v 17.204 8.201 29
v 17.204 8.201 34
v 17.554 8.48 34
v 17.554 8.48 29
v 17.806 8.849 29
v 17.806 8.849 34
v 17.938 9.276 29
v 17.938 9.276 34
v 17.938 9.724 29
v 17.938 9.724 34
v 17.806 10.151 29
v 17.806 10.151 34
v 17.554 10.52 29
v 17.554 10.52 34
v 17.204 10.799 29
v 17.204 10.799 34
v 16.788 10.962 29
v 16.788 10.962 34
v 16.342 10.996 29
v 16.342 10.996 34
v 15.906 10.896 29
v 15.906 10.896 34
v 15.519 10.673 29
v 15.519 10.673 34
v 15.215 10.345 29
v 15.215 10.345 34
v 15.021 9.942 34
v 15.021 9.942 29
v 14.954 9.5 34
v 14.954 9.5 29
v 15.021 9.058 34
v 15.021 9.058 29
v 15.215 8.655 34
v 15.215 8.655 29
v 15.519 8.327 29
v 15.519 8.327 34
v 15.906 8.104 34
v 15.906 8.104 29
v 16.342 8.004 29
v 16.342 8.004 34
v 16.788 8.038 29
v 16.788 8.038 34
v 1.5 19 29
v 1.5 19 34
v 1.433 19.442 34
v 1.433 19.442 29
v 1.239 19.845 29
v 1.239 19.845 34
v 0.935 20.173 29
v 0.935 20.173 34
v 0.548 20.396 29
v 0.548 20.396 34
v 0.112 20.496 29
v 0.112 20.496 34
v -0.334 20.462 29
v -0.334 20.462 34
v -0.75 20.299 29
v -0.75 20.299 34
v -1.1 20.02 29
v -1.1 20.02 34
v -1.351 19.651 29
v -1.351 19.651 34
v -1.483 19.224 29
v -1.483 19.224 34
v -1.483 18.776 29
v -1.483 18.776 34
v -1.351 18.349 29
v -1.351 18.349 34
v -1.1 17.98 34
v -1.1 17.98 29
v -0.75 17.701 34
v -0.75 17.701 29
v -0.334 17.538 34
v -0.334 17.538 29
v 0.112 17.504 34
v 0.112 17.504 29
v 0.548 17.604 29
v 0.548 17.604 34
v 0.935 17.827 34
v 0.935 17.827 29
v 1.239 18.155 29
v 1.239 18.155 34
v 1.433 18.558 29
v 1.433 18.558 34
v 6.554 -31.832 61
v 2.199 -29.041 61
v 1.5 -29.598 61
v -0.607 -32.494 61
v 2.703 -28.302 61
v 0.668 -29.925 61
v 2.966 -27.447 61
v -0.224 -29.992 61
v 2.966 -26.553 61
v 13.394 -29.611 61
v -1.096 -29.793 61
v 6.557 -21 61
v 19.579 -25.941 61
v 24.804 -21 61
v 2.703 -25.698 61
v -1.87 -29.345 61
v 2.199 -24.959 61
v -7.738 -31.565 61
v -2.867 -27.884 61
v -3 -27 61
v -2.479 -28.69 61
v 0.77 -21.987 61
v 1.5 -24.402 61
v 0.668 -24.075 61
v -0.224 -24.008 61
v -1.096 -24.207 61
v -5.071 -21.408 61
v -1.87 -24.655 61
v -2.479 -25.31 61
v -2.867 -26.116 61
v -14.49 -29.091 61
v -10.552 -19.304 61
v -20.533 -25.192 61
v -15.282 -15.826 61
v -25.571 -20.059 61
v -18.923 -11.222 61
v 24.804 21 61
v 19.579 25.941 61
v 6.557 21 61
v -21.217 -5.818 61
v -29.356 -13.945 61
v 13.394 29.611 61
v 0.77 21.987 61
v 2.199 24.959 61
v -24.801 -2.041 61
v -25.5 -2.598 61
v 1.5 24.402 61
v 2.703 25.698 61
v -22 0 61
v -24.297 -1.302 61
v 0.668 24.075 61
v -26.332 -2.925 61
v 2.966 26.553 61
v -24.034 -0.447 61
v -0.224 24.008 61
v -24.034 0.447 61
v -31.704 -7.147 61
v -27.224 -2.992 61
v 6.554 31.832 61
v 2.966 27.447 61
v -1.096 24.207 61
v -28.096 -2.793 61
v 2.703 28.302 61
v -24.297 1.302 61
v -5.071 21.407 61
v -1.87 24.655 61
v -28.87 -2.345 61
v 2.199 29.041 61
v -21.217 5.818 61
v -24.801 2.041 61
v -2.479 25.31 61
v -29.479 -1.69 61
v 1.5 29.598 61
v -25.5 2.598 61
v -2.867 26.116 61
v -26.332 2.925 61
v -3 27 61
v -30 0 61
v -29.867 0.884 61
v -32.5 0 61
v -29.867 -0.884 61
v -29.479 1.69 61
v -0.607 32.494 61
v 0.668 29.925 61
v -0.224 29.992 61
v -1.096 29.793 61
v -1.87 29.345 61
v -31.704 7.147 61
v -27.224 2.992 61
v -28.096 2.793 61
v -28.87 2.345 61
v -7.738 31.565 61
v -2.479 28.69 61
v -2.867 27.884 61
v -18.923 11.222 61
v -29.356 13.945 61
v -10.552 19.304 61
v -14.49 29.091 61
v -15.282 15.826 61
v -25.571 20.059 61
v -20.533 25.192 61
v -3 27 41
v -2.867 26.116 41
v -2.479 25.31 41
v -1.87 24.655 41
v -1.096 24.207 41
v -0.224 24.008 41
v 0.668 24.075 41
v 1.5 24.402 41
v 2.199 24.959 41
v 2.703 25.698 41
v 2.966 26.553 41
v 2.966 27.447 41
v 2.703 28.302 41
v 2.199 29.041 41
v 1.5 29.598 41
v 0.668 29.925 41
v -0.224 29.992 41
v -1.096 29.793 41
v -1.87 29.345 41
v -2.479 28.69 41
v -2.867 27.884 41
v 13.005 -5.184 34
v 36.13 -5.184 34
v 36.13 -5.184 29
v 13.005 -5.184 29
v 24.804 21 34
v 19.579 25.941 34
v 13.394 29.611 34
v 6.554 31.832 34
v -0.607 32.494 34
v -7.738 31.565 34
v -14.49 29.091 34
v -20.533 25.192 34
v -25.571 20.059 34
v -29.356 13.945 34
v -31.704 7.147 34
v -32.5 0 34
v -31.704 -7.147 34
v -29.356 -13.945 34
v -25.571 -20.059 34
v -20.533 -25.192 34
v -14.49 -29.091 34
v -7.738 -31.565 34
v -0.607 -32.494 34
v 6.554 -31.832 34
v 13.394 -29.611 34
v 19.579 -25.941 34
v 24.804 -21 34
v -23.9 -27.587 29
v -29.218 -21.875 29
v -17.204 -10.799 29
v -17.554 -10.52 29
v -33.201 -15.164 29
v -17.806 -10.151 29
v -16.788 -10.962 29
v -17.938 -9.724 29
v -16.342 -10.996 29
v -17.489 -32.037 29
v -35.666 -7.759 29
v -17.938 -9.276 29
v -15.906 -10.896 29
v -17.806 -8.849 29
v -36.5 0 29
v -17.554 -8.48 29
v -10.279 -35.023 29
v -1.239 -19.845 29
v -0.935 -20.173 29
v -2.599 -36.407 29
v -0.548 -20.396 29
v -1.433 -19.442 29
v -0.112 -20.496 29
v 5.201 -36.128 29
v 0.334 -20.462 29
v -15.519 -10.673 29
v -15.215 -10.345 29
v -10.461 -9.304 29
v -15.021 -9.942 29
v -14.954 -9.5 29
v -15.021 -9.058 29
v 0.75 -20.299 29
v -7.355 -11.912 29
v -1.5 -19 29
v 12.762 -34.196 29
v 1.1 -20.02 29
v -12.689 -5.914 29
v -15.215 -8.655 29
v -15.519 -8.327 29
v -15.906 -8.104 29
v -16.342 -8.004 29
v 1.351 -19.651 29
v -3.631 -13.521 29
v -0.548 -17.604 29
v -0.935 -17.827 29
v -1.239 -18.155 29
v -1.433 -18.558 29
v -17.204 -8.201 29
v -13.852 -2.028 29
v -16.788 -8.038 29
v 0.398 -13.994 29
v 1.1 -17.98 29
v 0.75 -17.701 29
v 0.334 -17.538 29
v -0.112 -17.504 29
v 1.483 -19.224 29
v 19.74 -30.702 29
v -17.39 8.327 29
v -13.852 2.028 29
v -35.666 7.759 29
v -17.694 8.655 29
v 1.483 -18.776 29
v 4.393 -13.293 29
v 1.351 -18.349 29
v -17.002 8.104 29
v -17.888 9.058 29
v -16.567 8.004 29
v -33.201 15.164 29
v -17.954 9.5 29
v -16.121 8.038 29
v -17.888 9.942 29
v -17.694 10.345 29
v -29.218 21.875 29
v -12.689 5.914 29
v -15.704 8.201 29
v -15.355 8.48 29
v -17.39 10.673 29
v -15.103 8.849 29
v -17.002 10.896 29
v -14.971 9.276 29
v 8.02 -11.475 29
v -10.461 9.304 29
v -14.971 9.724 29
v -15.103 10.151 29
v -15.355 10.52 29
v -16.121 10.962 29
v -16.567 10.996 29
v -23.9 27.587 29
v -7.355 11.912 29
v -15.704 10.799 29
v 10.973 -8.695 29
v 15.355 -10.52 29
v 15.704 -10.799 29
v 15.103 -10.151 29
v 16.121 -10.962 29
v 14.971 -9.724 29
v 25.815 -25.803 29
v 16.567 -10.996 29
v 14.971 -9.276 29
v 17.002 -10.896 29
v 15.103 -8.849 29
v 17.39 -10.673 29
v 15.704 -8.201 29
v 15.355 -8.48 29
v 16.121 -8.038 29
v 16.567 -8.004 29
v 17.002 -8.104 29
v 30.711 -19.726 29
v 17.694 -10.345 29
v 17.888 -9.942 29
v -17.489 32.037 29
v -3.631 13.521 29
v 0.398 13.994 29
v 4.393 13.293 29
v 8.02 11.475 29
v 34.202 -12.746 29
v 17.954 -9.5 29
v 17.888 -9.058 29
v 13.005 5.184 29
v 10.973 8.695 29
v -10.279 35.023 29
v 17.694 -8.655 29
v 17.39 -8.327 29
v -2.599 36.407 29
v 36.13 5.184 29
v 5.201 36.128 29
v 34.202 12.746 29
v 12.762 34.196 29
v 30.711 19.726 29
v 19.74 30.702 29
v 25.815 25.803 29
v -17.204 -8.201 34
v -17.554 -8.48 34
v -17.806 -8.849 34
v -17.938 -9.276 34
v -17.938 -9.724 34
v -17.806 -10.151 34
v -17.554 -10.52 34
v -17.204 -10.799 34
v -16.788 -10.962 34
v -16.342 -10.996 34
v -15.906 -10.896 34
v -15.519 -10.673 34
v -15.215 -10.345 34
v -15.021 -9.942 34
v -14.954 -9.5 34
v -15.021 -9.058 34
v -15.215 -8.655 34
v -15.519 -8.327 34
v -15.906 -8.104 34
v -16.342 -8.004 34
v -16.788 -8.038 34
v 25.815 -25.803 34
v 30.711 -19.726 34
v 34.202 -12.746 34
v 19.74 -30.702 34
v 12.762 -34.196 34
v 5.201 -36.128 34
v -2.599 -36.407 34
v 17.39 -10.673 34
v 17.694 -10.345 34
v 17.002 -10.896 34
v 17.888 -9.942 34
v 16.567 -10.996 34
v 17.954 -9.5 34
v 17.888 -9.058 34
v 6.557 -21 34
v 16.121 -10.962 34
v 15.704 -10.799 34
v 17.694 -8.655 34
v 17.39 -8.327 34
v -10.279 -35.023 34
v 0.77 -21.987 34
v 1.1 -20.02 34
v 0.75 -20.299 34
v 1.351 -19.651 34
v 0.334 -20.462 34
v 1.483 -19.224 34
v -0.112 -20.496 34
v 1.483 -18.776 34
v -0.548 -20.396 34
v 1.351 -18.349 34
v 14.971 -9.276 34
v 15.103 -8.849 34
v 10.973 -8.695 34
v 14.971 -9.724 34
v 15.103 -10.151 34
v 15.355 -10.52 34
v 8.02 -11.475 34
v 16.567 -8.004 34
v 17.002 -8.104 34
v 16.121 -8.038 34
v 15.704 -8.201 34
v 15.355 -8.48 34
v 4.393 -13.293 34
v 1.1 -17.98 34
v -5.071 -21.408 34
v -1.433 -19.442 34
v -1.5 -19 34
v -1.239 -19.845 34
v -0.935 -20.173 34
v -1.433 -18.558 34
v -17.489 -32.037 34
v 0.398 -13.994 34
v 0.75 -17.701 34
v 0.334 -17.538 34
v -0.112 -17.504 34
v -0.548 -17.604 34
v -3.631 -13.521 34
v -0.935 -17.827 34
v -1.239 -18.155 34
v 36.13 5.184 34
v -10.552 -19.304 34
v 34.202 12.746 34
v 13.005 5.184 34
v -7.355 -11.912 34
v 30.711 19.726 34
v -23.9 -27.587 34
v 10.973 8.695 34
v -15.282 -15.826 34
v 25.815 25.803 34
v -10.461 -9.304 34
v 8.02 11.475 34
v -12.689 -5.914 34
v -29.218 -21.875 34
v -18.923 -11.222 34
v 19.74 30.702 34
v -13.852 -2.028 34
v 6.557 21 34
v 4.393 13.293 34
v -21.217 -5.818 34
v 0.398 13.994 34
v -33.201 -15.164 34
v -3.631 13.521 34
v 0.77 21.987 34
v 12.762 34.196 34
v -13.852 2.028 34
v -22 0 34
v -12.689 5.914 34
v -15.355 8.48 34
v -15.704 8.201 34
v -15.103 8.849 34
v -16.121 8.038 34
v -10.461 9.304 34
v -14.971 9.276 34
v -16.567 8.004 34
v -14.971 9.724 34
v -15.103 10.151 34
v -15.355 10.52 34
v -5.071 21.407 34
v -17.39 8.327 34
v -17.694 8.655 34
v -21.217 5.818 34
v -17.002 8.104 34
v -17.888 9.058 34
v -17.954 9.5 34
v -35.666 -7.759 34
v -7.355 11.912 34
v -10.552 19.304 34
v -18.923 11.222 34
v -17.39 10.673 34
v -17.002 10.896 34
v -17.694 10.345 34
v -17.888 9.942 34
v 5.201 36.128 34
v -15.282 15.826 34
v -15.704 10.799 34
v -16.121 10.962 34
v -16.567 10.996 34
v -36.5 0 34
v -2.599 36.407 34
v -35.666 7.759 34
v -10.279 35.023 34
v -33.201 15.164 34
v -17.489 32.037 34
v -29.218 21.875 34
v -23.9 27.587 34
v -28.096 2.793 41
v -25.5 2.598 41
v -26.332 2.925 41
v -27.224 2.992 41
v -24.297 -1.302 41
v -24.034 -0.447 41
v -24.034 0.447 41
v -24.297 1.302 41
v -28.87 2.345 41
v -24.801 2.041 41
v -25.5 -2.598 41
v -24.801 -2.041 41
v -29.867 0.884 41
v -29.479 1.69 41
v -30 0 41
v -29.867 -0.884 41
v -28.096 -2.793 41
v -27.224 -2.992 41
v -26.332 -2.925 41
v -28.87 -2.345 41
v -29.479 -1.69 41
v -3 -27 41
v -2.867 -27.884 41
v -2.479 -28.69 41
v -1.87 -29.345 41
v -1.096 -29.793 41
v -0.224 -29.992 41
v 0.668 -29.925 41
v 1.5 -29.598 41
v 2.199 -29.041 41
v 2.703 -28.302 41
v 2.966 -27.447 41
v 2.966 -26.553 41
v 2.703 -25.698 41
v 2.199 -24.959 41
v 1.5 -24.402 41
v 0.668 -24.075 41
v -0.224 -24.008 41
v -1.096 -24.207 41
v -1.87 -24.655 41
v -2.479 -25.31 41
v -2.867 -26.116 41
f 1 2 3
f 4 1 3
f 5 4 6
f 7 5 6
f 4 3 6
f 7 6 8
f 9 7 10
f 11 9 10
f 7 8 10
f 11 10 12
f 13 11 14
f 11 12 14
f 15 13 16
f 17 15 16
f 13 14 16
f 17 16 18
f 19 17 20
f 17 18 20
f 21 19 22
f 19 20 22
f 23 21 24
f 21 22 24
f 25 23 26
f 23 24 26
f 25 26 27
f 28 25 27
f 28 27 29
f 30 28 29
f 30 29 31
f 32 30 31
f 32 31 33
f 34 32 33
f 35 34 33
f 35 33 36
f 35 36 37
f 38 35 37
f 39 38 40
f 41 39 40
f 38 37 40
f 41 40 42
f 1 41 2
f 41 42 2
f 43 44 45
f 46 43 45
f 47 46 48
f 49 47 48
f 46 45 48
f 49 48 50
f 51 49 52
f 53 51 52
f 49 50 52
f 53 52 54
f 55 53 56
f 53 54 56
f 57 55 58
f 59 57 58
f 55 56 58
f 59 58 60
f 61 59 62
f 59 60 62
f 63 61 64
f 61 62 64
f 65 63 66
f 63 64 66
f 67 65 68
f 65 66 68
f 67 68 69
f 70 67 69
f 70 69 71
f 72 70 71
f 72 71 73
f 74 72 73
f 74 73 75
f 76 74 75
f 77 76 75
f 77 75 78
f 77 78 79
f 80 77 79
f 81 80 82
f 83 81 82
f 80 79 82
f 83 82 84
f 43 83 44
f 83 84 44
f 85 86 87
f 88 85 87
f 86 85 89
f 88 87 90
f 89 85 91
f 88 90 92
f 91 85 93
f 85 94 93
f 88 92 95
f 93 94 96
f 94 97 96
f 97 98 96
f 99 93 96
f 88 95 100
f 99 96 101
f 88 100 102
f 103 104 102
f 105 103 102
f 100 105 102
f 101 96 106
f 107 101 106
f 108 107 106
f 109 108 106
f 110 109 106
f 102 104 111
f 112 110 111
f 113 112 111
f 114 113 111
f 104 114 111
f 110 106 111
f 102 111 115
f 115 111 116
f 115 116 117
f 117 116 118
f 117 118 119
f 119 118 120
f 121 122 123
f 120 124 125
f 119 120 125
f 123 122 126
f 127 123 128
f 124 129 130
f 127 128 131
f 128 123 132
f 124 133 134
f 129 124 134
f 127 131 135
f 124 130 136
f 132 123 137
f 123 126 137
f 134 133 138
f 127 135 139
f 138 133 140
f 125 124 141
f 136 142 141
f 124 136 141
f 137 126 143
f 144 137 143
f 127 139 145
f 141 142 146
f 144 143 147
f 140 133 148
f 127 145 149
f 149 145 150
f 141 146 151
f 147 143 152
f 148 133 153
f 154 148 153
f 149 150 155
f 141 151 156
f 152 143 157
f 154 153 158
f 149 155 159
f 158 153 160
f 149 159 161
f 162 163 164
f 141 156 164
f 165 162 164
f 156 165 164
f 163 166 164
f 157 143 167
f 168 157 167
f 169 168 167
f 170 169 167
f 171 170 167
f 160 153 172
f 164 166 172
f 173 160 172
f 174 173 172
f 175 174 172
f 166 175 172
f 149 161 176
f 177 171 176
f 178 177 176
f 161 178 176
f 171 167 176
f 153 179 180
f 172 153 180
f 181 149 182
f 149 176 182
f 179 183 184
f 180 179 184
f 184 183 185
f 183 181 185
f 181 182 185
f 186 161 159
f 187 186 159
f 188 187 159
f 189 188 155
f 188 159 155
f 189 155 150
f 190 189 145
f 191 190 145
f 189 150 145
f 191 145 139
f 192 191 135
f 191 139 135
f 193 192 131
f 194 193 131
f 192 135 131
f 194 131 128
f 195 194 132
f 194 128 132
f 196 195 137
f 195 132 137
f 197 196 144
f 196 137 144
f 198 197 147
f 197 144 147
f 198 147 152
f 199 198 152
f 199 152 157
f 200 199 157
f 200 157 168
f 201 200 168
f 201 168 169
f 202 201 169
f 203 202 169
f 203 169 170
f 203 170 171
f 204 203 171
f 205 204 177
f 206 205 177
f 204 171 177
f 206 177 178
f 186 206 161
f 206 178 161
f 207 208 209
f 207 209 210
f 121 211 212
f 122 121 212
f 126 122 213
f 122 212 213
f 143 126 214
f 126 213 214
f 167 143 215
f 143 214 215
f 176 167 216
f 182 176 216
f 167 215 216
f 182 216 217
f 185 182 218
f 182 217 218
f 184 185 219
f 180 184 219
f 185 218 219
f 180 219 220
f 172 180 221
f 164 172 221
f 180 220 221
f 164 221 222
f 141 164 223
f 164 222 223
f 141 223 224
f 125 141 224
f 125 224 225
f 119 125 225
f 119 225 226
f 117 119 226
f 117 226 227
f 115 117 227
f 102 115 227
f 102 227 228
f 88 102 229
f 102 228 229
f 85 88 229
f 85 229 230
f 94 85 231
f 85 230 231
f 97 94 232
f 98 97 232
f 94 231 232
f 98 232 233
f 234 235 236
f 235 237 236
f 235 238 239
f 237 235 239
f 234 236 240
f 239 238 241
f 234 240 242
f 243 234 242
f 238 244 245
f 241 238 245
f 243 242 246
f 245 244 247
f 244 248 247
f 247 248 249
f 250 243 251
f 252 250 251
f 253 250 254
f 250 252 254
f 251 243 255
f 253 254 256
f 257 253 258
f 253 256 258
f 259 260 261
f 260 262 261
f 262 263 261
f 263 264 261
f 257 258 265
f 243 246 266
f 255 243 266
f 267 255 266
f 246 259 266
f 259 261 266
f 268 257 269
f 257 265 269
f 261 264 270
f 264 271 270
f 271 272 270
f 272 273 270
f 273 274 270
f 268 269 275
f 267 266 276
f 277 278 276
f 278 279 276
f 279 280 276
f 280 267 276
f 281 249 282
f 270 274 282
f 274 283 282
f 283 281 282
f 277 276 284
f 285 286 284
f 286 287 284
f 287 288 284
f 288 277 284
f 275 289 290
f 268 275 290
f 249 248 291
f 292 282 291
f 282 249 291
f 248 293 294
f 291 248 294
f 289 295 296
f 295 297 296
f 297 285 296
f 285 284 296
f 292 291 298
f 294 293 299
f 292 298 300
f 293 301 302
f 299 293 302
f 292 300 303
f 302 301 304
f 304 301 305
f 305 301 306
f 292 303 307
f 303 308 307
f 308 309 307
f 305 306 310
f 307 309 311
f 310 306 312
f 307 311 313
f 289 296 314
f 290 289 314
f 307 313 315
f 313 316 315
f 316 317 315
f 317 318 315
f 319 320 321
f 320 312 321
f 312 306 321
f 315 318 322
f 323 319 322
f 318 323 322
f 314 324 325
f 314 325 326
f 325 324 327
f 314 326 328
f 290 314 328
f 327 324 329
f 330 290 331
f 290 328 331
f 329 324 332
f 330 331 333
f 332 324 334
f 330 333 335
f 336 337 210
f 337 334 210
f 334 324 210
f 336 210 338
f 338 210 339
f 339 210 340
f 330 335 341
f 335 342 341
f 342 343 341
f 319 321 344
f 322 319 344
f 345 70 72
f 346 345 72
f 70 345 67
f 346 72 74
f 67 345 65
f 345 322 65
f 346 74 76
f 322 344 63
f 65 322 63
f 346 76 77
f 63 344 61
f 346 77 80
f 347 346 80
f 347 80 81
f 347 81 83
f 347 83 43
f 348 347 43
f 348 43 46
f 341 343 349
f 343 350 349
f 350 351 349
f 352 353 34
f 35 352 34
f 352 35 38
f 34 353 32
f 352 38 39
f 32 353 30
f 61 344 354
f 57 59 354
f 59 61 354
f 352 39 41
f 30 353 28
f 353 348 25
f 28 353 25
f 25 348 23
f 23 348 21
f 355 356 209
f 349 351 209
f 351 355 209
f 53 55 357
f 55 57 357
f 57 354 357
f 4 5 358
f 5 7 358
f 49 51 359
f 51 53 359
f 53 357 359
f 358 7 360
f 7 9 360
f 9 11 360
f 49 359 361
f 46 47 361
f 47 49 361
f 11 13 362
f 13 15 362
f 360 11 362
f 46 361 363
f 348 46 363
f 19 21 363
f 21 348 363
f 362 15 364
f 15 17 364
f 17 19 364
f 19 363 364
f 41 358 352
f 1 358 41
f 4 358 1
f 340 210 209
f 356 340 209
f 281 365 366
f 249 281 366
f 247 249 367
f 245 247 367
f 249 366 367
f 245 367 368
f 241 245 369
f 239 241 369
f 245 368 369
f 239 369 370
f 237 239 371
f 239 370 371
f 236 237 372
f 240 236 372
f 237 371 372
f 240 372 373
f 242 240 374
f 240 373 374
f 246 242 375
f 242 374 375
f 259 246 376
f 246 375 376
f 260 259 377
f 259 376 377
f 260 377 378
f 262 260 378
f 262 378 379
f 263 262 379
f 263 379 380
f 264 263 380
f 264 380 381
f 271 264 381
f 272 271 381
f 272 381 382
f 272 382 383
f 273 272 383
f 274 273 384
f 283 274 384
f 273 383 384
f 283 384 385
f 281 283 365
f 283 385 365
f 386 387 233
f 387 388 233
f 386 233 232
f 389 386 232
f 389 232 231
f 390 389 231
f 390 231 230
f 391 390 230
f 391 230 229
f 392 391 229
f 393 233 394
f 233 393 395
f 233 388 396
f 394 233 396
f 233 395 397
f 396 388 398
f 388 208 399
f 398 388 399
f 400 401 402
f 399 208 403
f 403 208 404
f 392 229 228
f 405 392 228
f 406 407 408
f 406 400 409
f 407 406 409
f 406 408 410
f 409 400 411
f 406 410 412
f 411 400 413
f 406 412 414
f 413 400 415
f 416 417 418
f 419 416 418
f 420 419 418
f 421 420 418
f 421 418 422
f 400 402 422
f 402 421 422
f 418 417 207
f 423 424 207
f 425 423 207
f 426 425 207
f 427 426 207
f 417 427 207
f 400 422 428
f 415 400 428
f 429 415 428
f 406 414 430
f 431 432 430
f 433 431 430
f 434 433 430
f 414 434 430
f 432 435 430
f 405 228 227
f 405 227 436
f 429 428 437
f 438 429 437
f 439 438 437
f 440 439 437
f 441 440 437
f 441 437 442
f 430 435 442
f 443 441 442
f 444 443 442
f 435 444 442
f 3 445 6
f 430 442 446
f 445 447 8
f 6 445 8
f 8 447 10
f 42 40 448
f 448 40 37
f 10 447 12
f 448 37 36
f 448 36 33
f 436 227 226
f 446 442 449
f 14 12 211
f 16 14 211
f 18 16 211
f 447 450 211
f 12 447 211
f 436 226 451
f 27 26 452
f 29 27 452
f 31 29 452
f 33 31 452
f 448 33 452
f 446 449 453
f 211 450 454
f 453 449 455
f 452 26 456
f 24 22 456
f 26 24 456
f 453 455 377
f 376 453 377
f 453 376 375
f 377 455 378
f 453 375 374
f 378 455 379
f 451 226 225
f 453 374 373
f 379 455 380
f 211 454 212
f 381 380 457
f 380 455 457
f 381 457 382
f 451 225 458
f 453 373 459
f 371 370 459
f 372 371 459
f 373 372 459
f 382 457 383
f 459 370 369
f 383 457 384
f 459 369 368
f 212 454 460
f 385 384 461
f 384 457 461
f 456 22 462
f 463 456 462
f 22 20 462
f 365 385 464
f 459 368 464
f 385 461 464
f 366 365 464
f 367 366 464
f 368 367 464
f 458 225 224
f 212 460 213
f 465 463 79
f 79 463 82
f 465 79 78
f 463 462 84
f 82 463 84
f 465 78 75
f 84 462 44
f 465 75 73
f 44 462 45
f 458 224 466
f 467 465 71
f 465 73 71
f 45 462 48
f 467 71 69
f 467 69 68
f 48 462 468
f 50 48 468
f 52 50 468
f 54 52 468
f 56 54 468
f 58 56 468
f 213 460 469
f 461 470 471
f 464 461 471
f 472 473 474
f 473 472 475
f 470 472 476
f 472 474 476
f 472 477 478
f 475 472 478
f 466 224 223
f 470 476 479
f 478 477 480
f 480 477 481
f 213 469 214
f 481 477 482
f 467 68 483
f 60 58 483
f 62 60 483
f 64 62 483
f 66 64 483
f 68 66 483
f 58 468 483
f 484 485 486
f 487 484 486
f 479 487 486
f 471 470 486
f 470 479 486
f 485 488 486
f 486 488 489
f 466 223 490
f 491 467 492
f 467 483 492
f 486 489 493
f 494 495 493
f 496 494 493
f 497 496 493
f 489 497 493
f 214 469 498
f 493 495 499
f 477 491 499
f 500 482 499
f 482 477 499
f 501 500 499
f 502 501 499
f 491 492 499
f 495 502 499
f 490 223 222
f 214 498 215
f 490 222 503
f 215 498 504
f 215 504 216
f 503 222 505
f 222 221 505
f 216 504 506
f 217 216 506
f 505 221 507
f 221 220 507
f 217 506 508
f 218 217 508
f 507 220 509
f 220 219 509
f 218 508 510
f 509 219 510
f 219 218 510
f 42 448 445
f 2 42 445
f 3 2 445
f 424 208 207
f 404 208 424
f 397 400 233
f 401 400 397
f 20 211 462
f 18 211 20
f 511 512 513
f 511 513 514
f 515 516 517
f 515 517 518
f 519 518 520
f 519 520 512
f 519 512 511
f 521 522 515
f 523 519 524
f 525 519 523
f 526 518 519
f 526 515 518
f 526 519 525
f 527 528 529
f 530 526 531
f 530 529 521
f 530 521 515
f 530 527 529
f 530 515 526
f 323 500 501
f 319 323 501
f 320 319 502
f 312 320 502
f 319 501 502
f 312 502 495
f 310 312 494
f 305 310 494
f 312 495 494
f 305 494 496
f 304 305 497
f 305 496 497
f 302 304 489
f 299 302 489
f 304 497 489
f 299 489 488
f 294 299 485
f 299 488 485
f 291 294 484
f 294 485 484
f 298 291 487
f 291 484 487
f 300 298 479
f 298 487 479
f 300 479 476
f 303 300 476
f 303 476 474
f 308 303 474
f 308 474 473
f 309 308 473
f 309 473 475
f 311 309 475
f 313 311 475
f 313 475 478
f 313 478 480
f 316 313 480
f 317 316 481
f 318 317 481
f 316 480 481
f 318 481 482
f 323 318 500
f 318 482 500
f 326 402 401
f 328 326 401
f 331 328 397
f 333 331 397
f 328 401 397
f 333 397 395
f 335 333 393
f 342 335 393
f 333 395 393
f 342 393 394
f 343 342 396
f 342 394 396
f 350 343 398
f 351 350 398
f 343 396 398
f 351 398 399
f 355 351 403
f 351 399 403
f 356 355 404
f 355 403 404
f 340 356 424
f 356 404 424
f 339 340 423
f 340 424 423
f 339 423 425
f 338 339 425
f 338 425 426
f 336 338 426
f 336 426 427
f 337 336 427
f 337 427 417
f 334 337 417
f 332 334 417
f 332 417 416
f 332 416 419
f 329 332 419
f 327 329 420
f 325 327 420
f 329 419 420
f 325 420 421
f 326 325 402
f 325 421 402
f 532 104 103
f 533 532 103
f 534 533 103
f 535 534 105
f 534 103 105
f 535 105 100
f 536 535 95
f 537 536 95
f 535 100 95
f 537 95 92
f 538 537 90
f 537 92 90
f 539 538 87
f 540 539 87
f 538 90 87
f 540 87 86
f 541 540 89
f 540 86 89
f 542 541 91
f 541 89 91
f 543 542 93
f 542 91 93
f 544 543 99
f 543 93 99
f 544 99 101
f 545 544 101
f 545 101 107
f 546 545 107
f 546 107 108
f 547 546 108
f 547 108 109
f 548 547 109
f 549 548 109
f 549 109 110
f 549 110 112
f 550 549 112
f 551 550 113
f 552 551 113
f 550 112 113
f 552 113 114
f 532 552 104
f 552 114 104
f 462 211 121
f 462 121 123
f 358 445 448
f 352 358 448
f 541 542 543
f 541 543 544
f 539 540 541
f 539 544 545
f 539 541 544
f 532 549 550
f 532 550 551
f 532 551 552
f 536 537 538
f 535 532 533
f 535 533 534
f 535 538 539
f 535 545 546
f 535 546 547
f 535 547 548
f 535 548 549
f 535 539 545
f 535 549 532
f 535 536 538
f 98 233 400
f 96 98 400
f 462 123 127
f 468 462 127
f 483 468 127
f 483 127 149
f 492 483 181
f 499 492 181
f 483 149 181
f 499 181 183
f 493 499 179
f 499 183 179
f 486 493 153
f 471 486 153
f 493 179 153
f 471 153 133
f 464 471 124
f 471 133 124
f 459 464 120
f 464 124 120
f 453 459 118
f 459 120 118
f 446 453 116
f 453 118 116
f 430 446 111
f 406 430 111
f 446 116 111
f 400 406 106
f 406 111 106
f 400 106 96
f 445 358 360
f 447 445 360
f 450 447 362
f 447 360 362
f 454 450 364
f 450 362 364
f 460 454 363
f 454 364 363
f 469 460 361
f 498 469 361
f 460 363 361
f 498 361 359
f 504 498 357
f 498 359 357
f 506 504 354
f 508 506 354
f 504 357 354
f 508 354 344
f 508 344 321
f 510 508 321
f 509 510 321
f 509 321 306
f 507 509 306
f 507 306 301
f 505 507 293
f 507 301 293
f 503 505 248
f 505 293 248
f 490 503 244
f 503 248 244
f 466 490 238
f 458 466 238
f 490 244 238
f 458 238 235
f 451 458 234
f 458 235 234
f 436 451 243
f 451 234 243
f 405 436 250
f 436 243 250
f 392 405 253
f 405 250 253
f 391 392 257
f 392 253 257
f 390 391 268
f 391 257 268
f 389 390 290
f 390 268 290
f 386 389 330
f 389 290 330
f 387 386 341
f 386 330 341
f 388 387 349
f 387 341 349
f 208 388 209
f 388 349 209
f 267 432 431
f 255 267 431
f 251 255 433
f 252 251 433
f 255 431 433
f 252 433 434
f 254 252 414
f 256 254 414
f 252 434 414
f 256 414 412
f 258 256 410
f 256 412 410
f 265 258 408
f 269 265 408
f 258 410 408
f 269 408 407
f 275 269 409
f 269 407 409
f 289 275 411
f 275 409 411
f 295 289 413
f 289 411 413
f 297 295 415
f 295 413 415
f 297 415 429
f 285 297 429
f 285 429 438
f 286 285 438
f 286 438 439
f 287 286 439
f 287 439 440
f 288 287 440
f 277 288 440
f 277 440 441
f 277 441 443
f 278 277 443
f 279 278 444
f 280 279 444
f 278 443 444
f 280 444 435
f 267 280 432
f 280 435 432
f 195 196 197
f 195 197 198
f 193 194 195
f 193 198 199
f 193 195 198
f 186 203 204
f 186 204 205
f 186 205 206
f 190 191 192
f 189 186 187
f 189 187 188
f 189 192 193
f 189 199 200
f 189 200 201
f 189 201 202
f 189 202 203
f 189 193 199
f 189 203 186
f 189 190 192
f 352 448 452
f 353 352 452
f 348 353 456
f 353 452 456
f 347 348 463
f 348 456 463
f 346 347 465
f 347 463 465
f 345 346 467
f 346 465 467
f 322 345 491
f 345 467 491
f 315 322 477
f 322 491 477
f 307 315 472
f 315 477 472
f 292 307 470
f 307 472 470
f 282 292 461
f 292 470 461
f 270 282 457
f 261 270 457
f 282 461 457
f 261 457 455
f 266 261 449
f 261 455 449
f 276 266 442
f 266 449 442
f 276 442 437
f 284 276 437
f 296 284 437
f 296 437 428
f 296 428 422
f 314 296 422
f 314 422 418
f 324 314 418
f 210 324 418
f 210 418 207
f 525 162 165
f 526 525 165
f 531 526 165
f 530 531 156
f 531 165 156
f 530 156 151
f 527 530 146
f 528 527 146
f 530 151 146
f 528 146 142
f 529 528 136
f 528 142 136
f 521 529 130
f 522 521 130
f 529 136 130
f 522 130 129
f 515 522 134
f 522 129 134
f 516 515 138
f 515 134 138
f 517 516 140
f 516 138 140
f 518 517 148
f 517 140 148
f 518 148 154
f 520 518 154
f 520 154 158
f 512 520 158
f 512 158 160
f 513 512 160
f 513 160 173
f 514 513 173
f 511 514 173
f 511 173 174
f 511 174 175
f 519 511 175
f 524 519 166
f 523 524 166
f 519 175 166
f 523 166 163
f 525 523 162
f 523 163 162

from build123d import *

# Parameters (mm, degrees)
SKETCH018_R           = 1.5
POCKET002_DEPTH       = 5
POLARPATTERN001_COUNT = 6
SKETCH019_W           = 44.124263
SKETCH019_H           = 42
POCKET003_DEPTH       = 27
SKETCH020_R           = 3
POCKET004_DEPTH       = 20
SKETCH021_W           = 55.928879
SKETCH021_H           = 10.367922
POCKET005_DEPTH       = 5


with BuildPart() as part:
    # Sketch017 → Revolution001 (revolve)
    with BuildSketch(Plane.XZ):
        Polygon((14, 0), (14, 5), (22, 5), (22, 32), (32.5, 32), (32.5, 5), (36.5, 5), (36.5, 0), align=None)
    revolve(axis=Axis((0, 0, 0), (0, 0, 1)))

    # Sketch018 (on Face2 of Revolution001) → Pocket002 (cut)
    with BuildSketch(Plane(origin=(0, 0, 5), x_dir=(-1, 0, 0), z_dir=(0, 0, 1))):
        with Locations((0, 19)):
            Circle(SKETCH018_R)
    pocket002 = extrude(amount=-POCKET002_DEPTH, mode=Mode.SUBTRACT)

    # PolarPattern001: Pocket002 ×6 about axis
    polarpattern001_axis = Axis((0, 0, 5), (0, 0, 1))
    for i in range(1, POLARPATTERN001_COUNT):
        add(pocket002.rotate(polarpattern001_axis, i * 360 / POLARPATTERN001_COUNT), mode=Mode.SUBTRACT)

    # Sketch019 (on Face13 of PolarPattern001) → Pocket003 (cut)
    with BuildSketch(Plane(origin=(0, 0, 32), x_dir=(-1, 0, 0), z_dir=(0, 0, 1))):
        with Locations((-25.154536, 0)):
            Rectangle(SKETCH019_W, SKETCH019_H)
    extrude(amount=-POCKET003_DEPTH, mode=Mode.SUBTRACT)

    # Sketch020 (on Face14 of Pocket003) → Pocket004 (cut)
    with BuildSketch(Plane(origin=(0, 0, 32), x_dir=(-1, 0, 0), z_dir=(0, 0, 1))):
        with Locations((0, 27)):
            Circle(SKETCH020_R)
        with Locations((0, -27)):
            Circle(SKETCH020_R)
        with Locations((27, 0)):
            Circle(SKETCH020_R)
    extrude(amount=-POCKET004_DEPTH, mode=Mode.SUBTRACT)

    # Sketch021 (on Face2 of Pocket004) → Pocket005 (cut)
    with BuildSketch(Plane(origin=(0, 0, 5), x_dir=(-1, 0, 0), z_dir=(0, 0, 1))):
        with Locations((-39.002113, 0)):
            Rectangle(SKETCH021_W, SKETCH021_H)
    extrude(amount=-POCKET005_DEPTH, mode=Mode.SUBTRACT)


with BuildPart() as part_1:
    # Body placement: moved
    add(part.part.moved(Location((0, -3e-06, 29.000002))))


solid = part_1.part
